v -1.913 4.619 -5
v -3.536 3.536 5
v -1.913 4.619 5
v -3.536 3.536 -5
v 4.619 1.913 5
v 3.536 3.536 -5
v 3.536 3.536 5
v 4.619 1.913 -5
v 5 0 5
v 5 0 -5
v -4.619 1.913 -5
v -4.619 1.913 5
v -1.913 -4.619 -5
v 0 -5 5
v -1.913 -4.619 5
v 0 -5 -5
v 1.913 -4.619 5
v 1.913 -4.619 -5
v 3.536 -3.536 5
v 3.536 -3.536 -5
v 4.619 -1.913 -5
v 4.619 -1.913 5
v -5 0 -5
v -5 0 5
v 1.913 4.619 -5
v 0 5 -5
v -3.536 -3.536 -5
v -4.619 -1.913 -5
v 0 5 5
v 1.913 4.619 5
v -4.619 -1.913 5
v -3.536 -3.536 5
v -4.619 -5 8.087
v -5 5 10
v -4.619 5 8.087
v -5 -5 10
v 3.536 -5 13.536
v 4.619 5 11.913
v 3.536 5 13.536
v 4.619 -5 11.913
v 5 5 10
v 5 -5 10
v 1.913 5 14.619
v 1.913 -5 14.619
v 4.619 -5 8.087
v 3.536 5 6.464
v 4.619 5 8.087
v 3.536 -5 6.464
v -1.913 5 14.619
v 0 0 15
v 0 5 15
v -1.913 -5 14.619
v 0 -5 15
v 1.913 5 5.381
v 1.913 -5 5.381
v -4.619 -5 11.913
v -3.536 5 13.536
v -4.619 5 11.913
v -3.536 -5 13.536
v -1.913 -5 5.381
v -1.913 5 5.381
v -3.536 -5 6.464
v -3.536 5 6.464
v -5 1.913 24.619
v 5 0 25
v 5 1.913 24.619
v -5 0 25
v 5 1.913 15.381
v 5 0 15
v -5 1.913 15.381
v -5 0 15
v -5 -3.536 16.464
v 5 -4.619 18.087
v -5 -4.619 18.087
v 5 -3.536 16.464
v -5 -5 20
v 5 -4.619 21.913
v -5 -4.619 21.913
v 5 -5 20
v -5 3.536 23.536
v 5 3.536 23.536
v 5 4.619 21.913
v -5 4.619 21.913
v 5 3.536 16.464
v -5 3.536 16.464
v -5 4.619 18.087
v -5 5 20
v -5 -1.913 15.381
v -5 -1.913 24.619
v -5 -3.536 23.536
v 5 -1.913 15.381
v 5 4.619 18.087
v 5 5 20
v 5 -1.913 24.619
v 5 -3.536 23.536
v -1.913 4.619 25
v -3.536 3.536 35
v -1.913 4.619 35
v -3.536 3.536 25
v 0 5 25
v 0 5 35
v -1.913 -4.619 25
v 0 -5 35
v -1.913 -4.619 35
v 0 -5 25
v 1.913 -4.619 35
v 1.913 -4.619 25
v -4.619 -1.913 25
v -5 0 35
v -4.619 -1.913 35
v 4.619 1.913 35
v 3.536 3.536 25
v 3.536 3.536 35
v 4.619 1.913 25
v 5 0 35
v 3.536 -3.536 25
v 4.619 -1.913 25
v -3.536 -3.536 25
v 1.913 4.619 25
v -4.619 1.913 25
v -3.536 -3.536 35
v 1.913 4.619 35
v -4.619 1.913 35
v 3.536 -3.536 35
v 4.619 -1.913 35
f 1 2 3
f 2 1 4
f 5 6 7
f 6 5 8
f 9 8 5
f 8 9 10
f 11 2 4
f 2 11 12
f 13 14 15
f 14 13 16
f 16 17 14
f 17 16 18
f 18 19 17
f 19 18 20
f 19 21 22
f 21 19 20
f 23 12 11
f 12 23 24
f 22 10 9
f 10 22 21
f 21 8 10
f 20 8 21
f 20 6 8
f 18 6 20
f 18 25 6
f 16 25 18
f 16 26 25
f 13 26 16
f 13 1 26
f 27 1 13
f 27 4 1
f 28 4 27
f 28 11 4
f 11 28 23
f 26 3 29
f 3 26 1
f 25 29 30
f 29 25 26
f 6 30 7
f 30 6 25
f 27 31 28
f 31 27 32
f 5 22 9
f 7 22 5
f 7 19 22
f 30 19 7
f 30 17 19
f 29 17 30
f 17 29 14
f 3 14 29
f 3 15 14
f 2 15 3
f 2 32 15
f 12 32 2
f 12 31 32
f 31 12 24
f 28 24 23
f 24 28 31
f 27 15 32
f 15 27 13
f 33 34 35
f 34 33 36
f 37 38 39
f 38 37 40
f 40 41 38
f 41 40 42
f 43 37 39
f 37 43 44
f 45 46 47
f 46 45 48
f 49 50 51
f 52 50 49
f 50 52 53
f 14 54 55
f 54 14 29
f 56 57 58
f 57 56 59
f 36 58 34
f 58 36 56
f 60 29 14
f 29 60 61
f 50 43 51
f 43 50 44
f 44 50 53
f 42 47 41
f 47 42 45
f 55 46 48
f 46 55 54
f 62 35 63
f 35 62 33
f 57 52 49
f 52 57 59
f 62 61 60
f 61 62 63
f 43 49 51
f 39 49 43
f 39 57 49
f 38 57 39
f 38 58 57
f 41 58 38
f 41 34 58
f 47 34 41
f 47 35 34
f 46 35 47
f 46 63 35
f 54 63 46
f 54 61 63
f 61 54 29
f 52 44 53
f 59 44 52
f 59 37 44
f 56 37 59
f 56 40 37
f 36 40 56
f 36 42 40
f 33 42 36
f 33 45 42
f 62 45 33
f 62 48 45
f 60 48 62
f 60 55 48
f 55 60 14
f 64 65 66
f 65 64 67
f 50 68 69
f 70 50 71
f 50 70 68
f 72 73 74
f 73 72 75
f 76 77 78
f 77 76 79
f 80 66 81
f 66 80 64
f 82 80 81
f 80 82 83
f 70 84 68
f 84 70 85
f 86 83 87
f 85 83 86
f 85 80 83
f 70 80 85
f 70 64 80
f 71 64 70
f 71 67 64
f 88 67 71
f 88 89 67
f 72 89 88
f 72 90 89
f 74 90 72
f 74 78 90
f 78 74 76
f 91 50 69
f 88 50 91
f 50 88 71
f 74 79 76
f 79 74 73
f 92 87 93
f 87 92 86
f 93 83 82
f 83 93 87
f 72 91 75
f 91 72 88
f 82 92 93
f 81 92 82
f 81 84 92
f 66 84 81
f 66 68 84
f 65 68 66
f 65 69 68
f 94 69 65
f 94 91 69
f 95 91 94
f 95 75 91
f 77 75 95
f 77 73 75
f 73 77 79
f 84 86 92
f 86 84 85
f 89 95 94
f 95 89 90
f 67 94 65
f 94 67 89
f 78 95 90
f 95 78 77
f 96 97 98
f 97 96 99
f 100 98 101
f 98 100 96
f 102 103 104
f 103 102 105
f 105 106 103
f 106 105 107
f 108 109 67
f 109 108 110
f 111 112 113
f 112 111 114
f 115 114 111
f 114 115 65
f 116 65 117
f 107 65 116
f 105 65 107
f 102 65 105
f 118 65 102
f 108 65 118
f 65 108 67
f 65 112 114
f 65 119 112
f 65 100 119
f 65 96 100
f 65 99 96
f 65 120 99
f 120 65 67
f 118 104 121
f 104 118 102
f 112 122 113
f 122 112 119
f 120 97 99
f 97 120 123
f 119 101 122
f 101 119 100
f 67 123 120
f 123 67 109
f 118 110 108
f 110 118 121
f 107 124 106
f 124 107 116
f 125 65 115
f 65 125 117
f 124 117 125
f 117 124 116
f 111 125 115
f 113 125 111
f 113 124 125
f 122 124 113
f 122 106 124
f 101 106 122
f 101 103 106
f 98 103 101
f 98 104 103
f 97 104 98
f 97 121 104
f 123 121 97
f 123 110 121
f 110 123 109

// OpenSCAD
//Ejemplo_1
rotate([0, 0, 0]) {
    cylinder(10,r=5,center=true);
}

//Ejemplo_2
translate([0, 0, 10]) {
    rotate([90, 0, 0]) {
        cylinder(10,r=5,center=true);
    }
}

//Ejemplo_3
translate([0, 0, 20]) {
    rotate([0, 90, 0]) {
        cylinder(10,r=5,center=true);
    }
}

//Ejemplo_4
translate([0, 0, 30]) {
    rotate([0, 0, 90]) {
        cylinder(10,r=5,center=true);
    }
}
